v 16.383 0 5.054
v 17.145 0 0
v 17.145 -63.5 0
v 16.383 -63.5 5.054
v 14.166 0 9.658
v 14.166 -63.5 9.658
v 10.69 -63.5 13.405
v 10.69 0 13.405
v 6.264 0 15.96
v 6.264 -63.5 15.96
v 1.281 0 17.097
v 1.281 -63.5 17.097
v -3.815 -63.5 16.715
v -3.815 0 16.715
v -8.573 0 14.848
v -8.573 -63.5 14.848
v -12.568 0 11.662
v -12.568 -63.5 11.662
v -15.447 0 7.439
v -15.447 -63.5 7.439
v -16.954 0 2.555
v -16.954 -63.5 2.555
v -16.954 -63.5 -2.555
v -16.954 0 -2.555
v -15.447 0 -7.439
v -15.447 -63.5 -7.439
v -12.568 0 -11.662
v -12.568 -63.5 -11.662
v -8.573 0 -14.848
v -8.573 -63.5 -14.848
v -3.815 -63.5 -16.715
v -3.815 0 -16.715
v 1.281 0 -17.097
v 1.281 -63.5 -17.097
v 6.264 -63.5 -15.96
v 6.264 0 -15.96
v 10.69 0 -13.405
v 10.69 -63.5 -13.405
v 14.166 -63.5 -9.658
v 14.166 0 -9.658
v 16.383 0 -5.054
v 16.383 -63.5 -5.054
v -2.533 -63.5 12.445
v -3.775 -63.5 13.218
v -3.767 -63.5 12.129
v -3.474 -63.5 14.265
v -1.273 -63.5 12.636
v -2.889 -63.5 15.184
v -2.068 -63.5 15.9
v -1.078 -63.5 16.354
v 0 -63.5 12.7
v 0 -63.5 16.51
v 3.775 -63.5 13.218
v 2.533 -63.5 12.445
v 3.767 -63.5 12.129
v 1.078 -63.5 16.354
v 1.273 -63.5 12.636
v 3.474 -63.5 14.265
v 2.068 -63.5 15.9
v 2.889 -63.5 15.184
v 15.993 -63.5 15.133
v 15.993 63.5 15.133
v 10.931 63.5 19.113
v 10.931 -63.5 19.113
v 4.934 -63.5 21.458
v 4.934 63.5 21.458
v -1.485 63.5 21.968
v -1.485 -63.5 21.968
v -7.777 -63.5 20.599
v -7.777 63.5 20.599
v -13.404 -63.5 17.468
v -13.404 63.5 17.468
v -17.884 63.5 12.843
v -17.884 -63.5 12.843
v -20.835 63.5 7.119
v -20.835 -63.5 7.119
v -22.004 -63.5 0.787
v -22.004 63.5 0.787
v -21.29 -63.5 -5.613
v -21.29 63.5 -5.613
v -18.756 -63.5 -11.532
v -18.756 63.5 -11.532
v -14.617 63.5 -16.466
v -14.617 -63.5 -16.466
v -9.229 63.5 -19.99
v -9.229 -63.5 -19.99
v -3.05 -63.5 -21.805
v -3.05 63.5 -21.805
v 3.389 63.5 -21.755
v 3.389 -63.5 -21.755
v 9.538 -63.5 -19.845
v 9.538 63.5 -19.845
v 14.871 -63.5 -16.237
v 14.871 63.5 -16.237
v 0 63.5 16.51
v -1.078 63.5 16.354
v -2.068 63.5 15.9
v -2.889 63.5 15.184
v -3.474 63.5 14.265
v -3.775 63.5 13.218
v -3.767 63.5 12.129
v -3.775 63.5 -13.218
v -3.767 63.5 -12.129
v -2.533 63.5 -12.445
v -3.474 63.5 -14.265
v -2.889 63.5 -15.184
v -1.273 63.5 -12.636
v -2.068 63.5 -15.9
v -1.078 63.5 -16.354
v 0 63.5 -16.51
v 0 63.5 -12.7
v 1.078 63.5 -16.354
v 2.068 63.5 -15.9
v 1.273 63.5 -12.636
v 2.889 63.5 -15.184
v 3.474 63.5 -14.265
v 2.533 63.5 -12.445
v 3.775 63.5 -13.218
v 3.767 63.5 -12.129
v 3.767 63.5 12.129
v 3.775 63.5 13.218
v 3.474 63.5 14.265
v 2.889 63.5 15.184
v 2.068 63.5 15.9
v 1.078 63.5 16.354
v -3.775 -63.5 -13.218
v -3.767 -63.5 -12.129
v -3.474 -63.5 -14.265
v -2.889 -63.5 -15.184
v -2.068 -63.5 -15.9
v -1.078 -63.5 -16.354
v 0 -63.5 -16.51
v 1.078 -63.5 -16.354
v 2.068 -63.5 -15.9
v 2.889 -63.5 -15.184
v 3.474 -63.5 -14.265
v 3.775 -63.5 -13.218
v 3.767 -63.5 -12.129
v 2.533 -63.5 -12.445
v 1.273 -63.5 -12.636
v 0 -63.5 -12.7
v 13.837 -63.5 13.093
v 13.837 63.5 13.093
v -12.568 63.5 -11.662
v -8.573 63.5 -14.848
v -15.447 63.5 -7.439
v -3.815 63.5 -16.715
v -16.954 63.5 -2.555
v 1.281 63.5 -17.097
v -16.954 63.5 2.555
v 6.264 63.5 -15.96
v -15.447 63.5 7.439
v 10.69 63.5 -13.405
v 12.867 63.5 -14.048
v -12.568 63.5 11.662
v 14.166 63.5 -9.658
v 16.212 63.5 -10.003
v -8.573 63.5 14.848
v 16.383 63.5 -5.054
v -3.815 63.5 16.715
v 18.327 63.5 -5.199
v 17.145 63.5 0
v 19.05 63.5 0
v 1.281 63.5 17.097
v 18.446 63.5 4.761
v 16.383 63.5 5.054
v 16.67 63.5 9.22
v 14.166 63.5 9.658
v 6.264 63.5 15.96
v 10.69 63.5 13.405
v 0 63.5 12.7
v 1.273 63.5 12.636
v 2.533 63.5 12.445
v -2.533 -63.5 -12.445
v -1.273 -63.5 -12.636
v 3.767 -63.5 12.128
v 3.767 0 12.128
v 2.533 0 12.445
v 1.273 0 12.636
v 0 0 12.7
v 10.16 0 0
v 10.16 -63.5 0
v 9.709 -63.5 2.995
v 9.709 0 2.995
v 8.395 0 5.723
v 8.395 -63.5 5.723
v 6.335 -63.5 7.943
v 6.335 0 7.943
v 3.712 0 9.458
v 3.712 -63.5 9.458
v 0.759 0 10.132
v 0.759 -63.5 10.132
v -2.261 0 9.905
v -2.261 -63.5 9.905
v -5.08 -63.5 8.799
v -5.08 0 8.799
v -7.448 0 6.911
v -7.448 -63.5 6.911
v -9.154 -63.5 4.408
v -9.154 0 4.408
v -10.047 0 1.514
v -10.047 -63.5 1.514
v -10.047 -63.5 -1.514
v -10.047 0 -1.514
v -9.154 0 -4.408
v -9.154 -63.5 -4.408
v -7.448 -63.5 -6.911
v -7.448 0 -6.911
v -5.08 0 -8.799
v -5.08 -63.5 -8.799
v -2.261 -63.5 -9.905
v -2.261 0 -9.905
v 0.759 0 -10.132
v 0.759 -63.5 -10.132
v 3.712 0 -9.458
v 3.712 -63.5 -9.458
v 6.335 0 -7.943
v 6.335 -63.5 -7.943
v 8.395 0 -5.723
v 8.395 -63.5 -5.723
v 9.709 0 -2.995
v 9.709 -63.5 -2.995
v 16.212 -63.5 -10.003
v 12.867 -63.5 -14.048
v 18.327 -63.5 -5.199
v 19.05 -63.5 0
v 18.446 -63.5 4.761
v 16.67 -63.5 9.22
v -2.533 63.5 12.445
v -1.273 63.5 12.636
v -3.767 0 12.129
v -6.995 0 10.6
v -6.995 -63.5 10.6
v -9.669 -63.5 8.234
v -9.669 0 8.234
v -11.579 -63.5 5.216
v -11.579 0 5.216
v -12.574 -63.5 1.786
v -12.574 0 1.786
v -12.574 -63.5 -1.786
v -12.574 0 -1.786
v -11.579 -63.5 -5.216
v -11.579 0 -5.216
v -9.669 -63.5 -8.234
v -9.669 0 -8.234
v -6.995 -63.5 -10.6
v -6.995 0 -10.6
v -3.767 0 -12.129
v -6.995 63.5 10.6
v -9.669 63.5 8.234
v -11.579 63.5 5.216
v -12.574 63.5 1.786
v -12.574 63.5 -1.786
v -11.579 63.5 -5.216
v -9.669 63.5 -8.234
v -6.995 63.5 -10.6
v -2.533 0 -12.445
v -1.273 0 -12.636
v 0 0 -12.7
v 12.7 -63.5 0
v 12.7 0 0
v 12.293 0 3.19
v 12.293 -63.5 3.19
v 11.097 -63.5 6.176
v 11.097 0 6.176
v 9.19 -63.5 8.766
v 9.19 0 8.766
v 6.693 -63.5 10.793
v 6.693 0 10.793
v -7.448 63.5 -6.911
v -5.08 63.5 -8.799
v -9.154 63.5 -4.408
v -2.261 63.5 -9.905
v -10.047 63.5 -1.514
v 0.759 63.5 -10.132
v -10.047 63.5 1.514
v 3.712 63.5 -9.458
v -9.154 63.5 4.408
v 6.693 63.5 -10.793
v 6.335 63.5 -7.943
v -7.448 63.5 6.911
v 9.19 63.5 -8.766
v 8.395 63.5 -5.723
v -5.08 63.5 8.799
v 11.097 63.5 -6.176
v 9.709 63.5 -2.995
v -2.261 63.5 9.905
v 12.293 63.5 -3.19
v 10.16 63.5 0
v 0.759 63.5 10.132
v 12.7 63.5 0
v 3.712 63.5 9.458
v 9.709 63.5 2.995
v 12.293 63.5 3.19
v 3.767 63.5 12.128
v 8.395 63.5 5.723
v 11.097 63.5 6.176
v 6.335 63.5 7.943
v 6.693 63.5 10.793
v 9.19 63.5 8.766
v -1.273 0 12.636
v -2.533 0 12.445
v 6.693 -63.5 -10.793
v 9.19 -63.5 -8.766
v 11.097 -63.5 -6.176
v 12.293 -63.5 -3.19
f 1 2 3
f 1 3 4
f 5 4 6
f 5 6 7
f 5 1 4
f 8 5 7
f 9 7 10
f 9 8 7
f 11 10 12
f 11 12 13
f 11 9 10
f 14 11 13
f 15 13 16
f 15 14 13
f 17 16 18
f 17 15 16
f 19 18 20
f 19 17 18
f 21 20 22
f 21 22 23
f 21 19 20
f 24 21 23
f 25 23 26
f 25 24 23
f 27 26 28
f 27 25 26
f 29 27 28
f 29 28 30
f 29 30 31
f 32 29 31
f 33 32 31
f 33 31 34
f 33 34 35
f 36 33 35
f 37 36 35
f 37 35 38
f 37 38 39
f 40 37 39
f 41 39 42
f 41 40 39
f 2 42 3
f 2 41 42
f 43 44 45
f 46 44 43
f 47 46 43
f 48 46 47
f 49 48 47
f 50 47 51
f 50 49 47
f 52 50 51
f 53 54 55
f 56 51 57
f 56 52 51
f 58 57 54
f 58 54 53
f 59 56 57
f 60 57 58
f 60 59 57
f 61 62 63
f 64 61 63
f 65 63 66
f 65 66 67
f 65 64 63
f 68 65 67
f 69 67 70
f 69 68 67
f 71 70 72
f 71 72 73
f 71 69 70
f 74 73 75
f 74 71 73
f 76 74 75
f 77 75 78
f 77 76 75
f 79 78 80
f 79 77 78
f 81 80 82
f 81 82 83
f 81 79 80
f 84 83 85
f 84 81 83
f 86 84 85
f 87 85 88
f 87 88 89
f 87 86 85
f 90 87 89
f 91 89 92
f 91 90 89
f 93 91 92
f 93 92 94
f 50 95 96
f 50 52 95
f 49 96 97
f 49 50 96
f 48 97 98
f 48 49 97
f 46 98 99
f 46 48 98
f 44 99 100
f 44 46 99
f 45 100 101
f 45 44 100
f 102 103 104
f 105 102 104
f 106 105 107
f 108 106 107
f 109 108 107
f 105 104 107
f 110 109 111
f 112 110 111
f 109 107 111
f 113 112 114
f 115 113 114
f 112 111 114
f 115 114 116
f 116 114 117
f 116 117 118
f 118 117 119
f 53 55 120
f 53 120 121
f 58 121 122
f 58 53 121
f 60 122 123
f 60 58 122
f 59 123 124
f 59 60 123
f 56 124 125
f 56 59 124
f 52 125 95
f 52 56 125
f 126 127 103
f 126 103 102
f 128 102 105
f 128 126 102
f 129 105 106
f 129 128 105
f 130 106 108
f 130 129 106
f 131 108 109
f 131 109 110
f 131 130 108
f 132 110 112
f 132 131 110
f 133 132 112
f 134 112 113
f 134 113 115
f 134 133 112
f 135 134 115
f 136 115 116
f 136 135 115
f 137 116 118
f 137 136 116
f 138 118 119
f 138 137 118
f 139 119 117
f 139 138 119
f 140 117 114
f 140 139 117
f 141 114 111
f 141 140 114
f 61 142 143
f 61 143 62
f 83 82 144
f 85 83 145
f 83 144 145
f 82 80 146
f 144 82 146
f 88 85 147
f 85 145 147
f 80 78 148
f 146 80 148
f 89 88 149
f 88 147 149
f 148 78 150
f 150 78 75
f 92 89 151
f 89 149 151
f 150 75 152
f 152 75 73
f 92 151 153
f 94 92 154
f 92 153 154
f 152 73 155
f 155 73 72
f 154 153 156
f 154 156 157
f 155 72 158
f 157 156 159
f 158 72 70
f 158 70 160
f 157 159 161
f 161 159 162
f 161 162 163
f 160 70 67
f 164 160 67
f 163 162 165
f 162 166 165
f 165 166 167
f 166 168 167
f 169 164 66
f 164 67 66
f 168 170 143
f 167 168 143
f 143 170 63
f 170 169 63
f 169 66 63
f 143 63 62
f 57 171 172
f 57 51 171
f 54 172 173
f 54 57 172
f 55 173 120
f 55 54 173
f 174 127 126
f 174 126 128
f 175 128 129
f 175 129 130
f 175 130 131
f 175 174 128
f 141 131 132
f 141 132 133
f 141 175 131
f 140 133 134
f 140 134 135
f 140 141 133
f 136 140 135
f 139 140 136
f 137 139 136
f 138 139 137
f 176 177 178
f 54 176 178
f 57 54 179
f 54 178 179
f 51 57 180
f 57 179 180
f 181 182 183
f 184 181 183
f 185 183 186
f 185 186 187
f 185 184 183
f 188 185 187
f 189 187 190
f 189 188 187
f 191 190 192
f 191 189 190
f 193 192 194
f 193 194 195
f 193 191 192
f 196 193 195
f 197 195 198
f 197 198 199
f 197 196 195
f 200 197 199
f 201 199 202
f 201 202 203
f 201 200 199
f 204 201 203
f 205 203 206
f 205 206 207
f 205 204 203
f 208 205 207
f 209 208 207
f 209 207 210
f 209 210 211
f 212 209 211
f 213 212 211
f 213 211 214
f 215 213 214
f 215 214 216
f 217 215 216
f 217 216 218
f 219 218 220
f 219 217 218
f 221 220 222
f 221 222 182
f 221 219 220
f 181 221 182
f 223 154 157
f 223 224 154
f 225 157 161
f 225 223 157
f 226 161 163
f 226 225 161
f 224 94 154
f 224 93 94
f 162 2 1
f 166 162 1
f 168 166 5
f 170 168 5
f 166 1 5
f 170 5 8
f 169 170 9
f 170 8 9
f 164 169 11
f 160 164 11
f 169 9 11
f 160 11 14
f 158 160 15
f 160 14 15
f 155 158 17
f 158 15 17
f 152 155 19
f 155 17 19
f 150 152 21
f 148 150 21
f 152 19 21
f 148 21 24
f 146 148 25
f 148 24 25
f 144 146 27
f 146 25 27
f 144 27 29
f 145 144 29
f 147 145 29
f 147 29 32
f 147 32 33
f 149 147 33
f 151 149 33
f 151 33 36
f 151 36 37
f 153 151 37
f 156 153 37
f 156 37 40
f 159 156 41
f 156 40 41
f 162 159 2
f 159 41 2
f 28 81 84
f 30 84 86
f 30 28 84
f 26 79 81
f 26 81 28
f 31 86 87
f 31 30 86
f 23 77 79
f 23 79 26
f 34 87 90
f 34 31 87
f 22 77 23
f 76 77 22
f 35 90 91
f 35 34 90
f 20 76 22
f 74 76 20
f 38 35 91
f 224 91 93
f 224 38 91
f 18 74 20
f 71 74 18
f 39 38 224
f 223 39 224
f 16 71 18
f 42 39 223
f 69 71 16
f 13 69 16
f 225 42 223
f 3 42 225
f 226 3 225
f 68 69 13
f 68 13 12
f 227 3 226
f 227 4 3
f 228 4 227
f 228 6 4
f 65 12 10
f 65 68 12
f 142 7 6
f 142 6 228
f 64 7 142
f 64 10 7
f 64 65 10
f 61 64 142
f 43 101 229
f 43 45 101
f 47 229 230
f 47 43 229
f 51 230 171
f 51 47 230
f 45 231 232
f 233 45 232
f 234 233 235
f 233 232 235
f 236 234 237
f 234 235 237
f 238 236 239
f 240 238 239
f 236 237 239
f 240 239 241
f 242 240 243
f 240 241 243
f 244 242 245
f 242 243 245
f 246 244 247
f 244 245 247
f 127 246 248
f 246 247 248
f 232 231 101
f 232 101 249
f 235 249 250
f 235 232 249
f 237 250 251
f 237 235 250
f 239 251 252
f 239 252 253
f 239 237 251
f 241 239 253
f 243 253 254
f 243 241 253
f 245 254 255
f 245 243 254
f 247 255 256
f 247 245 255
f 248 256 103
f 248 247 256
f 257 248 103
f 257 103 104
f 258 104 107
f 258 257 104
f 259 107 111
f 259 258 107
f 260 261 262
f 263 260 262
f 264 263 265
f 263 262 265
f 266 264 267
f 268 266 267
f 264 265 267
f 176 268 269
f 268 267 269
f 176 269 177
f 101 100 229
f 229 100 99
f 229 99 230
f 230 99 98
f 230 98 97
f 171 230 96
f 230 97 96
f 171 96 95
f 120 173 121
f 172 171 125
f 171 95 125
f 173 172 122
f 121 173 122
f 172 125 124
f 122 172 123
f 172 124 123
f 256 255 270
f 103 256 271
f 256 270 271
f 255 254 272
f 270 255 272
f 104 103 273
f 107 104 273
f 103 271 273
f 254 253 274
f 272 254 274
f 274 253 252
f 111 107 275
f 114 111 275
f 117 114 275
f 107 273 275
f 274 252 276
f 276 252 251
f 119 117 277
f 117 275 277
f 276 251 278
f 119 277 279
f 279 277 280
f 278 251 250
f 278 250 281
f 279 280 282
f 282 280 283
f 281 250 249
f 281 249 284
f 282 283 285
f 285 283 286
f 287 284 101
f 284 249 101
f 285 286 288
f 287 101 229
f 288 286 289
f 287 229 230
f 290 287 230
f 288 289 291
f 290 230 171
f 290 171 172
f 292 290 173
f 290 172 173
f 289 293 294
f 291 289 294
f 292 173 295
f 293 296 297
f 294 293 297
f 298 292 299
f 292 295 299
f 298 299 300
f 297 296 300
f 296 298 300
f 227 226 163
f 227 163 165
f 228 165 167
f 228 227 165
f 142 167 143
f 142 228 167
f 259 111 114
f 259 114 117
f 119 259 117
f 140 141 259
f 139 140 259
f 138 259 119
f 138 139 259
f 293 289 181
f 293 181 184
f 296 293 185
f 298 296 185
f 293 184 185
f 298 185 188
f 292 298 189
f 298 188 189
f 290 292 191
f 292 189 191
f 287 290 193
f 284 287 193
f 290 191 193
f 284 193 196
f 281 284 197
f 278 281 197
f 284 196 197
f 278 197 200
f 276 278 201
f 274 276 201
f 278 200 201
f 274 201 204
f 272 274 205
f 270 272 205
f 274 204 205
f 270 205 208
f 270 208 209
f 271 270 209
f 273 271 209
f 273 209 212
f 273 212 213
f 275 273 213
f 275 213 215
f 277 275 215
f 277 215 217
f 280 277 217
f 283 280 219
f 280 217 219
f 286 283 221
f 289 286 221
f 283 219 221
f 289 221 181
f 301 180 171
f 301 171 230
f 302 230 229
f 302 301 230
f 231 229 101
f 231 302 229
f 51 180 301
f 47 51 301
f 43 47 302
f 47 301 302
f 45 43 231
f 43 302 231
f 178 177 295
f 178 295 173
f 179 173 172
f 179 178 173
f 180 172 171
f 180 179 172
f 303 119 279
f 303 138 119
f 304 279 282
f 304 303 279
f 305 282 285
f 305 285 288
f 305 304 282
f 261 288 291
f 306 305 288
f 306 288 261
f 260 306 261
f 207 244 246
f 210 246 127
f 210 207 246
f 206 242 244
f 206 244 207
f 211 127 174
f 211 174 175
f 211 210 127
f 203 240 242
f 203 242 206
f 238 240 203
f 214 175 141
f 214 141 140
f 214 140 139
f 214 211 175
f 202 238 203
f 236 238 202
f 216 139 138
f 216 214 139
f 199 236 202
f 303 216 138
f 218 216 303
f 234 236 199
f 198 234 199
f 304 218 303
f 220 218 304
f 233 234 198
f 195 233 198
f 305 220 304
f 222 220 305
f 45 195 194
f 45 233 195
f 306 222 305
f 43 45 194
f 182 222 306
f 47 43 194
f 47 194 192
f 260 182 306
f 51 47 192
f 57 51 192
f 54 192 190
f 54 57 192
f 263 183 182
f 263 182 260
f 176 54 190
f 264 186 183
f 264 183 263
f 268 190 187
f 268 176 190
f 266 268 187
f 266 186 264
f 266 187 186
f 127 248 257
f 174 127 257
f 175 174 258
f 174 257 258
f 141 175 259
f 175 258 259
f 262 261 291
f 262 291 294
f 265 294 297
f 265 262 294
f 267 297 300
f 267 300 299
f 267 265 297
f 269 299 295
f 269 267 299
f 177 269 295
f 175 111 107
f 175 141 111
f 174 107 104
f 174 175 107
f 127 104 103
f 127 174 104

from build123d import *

# Parameters (mm, degrees)
F8_DEPTH  = 63.5
F9_DEPTH  = 63.5
F10_DEPTH = 63.5
F0_R      = 17.145
F11_DEPTH = 63.5
F0_R_2    = 10.16
F12_DEPTH = 63.5


# Not quite as in the source:
# - the program builds the solid bodies; features that only make, move or delete a surface that nothing else refers to are left out


with BuildPart() as f8:
    # F0 (on Front) → F8 (new body, symmetric)
    with BuildSketch(Plane.XZ):
        with BuildLine():
            ThreePointArc((12.8668441558, -14.0480184179), (-19.037832377, 0.6807630905), (13.8373687009, 13.0931175598))
            Line((13.8373687009, 13.0931175598), (15.9931019877, 15.1329034441))
            ThreePointArc((15.9931019877, 15.1329034441), (-22.0037495142, 0.7868196455), (14.8713787493, -16.2365689705))
            Line((14.8713787493, -16.2365689705), (12.8668441558, -14.0480184179))
        make_face()
    extrude(amount=F8_DEPTH, both=True)

    # F0 (on Front) → F11 (join, symmetric)
    with BuildSketch(Plane.XZ):
        with BuildLine():
            ThreePointArc((12.8668441558, -14.0480184179), (17.4358234845, -7.6742790812), (19.05, 0))
            ThreePointArc((19.05, 0), (17.6989318004, 7.0462978311), (13.8373687009, 13.0931175598))
            ThreePointArc((13.8373687009, 13.0931175598), (-19.037832377, 0.6807630905), (12.8668441558, -14.0480184179))
        make_face()
        Circle(F0_R, mode=Mode.SUBTRACT)
    extrude(amount=F11_DEPTH, both=True)


with BuildPart() as f9:
    # F0 (on Front) → F9 (new body, symmetric)
    with BuildSketch(Plane.XZ):
        with BuildLine():
            ThreePointArc((-3.7668936473, 12.1285), (-1.905, 12.5563121576), (0, 12.7))
            Line((0, 12.7), (0, 16.51))
            ThreePointArc((0, 16.51), (-2.8890755442, 15.1838161164), (-3.7668936473, 12.1285))
        make_face()
    extrude(amount=F9_DEPTH, both=True)

    # F0 (on Front) → F10 (join, symmetric)
    with BuildSketch(Plane.XZ):
        with BuildLine():
            ThreePointArc((0, 12.7), (1.905, 12.5563121576), (3.7668936473, 12.1285))
            ThreePointArc((3.7668936473, 12.1285), (2.8890755442, 15.1838161164), (0, 16.51))
            Line((0, 16.51), (0, 12.7))
        make_face()
    extrude(amount=F10_DEPTH, both=True)


with BuildPart() as f10:
    # F0 (on Front) → F10, piece 2 (new body, symmetric)
    with BuildSketch(Plane.XZ):
        with BuildLine():
            Line((0, -16.51), (0, -12.7))
            ThreePointArc((0, -12.7), (-1.905, -12.5563121576), (-3.7668936473, -12.1285))
            ThreePointArc((-3.7668936473, -12.1285), (-2.8890755442, -15.1838161164), (0, -16.51))
        make_face()
        with BuildLine():
            ThreePointArc((0, -16.51), (2.8890755442, -15.1838161164), (3.7668936473, -12.1285))
            ThreePointArc((3.7668936473, -12.1285), (1.905, -12.5563121576), (0, -12.7))
            Line((0, -12.7), (0, -16.51))
        make_face()
    extrude(amount=F10_DEPTH, both=True)


with BuildPart() as f12:
    # F0 (on Front) → F12 (new body, symmetric)
    with BuildSketch(Plane.XZ):
        with BuildLine():
            ThreePointArc((3.7668936473, -12.1285), (10.2256918915, -7.5316150552), (12.7, 0))
            ThreePointArc((12.7, 0), (10.2256918915, 7.5316150552), (3.7668936473, 12.1285))
            ThreePointArc((3.7668936473, 12.1285), (1.905, 12.5563121576), (0, 12.7))
            ThreePointArc((0, 12.7), (-1.905, 12.5563121576), (-3.7668936473, 12.1285))
            ThreePointArc((-3.7668936473, 12.1285), (-12.7, 0), (-3.7668936473, -12.1285))
            ThreePointArc((-3.7668936473, -12.1285), (-1.905, -12.5563121576), (0, -12.7))
            ThreePointArc((0, -12.7), (1.905, -12.5563121576), (3.7668936473, -12.1285))
        make_face()
        Circle(F0_R_2, mode=Mode.SUBTRACT)
    extrude(amount=F12_DEPTH, both=True)


solid = Compound([f8.part, f9.part, f10.part, f12.part])
